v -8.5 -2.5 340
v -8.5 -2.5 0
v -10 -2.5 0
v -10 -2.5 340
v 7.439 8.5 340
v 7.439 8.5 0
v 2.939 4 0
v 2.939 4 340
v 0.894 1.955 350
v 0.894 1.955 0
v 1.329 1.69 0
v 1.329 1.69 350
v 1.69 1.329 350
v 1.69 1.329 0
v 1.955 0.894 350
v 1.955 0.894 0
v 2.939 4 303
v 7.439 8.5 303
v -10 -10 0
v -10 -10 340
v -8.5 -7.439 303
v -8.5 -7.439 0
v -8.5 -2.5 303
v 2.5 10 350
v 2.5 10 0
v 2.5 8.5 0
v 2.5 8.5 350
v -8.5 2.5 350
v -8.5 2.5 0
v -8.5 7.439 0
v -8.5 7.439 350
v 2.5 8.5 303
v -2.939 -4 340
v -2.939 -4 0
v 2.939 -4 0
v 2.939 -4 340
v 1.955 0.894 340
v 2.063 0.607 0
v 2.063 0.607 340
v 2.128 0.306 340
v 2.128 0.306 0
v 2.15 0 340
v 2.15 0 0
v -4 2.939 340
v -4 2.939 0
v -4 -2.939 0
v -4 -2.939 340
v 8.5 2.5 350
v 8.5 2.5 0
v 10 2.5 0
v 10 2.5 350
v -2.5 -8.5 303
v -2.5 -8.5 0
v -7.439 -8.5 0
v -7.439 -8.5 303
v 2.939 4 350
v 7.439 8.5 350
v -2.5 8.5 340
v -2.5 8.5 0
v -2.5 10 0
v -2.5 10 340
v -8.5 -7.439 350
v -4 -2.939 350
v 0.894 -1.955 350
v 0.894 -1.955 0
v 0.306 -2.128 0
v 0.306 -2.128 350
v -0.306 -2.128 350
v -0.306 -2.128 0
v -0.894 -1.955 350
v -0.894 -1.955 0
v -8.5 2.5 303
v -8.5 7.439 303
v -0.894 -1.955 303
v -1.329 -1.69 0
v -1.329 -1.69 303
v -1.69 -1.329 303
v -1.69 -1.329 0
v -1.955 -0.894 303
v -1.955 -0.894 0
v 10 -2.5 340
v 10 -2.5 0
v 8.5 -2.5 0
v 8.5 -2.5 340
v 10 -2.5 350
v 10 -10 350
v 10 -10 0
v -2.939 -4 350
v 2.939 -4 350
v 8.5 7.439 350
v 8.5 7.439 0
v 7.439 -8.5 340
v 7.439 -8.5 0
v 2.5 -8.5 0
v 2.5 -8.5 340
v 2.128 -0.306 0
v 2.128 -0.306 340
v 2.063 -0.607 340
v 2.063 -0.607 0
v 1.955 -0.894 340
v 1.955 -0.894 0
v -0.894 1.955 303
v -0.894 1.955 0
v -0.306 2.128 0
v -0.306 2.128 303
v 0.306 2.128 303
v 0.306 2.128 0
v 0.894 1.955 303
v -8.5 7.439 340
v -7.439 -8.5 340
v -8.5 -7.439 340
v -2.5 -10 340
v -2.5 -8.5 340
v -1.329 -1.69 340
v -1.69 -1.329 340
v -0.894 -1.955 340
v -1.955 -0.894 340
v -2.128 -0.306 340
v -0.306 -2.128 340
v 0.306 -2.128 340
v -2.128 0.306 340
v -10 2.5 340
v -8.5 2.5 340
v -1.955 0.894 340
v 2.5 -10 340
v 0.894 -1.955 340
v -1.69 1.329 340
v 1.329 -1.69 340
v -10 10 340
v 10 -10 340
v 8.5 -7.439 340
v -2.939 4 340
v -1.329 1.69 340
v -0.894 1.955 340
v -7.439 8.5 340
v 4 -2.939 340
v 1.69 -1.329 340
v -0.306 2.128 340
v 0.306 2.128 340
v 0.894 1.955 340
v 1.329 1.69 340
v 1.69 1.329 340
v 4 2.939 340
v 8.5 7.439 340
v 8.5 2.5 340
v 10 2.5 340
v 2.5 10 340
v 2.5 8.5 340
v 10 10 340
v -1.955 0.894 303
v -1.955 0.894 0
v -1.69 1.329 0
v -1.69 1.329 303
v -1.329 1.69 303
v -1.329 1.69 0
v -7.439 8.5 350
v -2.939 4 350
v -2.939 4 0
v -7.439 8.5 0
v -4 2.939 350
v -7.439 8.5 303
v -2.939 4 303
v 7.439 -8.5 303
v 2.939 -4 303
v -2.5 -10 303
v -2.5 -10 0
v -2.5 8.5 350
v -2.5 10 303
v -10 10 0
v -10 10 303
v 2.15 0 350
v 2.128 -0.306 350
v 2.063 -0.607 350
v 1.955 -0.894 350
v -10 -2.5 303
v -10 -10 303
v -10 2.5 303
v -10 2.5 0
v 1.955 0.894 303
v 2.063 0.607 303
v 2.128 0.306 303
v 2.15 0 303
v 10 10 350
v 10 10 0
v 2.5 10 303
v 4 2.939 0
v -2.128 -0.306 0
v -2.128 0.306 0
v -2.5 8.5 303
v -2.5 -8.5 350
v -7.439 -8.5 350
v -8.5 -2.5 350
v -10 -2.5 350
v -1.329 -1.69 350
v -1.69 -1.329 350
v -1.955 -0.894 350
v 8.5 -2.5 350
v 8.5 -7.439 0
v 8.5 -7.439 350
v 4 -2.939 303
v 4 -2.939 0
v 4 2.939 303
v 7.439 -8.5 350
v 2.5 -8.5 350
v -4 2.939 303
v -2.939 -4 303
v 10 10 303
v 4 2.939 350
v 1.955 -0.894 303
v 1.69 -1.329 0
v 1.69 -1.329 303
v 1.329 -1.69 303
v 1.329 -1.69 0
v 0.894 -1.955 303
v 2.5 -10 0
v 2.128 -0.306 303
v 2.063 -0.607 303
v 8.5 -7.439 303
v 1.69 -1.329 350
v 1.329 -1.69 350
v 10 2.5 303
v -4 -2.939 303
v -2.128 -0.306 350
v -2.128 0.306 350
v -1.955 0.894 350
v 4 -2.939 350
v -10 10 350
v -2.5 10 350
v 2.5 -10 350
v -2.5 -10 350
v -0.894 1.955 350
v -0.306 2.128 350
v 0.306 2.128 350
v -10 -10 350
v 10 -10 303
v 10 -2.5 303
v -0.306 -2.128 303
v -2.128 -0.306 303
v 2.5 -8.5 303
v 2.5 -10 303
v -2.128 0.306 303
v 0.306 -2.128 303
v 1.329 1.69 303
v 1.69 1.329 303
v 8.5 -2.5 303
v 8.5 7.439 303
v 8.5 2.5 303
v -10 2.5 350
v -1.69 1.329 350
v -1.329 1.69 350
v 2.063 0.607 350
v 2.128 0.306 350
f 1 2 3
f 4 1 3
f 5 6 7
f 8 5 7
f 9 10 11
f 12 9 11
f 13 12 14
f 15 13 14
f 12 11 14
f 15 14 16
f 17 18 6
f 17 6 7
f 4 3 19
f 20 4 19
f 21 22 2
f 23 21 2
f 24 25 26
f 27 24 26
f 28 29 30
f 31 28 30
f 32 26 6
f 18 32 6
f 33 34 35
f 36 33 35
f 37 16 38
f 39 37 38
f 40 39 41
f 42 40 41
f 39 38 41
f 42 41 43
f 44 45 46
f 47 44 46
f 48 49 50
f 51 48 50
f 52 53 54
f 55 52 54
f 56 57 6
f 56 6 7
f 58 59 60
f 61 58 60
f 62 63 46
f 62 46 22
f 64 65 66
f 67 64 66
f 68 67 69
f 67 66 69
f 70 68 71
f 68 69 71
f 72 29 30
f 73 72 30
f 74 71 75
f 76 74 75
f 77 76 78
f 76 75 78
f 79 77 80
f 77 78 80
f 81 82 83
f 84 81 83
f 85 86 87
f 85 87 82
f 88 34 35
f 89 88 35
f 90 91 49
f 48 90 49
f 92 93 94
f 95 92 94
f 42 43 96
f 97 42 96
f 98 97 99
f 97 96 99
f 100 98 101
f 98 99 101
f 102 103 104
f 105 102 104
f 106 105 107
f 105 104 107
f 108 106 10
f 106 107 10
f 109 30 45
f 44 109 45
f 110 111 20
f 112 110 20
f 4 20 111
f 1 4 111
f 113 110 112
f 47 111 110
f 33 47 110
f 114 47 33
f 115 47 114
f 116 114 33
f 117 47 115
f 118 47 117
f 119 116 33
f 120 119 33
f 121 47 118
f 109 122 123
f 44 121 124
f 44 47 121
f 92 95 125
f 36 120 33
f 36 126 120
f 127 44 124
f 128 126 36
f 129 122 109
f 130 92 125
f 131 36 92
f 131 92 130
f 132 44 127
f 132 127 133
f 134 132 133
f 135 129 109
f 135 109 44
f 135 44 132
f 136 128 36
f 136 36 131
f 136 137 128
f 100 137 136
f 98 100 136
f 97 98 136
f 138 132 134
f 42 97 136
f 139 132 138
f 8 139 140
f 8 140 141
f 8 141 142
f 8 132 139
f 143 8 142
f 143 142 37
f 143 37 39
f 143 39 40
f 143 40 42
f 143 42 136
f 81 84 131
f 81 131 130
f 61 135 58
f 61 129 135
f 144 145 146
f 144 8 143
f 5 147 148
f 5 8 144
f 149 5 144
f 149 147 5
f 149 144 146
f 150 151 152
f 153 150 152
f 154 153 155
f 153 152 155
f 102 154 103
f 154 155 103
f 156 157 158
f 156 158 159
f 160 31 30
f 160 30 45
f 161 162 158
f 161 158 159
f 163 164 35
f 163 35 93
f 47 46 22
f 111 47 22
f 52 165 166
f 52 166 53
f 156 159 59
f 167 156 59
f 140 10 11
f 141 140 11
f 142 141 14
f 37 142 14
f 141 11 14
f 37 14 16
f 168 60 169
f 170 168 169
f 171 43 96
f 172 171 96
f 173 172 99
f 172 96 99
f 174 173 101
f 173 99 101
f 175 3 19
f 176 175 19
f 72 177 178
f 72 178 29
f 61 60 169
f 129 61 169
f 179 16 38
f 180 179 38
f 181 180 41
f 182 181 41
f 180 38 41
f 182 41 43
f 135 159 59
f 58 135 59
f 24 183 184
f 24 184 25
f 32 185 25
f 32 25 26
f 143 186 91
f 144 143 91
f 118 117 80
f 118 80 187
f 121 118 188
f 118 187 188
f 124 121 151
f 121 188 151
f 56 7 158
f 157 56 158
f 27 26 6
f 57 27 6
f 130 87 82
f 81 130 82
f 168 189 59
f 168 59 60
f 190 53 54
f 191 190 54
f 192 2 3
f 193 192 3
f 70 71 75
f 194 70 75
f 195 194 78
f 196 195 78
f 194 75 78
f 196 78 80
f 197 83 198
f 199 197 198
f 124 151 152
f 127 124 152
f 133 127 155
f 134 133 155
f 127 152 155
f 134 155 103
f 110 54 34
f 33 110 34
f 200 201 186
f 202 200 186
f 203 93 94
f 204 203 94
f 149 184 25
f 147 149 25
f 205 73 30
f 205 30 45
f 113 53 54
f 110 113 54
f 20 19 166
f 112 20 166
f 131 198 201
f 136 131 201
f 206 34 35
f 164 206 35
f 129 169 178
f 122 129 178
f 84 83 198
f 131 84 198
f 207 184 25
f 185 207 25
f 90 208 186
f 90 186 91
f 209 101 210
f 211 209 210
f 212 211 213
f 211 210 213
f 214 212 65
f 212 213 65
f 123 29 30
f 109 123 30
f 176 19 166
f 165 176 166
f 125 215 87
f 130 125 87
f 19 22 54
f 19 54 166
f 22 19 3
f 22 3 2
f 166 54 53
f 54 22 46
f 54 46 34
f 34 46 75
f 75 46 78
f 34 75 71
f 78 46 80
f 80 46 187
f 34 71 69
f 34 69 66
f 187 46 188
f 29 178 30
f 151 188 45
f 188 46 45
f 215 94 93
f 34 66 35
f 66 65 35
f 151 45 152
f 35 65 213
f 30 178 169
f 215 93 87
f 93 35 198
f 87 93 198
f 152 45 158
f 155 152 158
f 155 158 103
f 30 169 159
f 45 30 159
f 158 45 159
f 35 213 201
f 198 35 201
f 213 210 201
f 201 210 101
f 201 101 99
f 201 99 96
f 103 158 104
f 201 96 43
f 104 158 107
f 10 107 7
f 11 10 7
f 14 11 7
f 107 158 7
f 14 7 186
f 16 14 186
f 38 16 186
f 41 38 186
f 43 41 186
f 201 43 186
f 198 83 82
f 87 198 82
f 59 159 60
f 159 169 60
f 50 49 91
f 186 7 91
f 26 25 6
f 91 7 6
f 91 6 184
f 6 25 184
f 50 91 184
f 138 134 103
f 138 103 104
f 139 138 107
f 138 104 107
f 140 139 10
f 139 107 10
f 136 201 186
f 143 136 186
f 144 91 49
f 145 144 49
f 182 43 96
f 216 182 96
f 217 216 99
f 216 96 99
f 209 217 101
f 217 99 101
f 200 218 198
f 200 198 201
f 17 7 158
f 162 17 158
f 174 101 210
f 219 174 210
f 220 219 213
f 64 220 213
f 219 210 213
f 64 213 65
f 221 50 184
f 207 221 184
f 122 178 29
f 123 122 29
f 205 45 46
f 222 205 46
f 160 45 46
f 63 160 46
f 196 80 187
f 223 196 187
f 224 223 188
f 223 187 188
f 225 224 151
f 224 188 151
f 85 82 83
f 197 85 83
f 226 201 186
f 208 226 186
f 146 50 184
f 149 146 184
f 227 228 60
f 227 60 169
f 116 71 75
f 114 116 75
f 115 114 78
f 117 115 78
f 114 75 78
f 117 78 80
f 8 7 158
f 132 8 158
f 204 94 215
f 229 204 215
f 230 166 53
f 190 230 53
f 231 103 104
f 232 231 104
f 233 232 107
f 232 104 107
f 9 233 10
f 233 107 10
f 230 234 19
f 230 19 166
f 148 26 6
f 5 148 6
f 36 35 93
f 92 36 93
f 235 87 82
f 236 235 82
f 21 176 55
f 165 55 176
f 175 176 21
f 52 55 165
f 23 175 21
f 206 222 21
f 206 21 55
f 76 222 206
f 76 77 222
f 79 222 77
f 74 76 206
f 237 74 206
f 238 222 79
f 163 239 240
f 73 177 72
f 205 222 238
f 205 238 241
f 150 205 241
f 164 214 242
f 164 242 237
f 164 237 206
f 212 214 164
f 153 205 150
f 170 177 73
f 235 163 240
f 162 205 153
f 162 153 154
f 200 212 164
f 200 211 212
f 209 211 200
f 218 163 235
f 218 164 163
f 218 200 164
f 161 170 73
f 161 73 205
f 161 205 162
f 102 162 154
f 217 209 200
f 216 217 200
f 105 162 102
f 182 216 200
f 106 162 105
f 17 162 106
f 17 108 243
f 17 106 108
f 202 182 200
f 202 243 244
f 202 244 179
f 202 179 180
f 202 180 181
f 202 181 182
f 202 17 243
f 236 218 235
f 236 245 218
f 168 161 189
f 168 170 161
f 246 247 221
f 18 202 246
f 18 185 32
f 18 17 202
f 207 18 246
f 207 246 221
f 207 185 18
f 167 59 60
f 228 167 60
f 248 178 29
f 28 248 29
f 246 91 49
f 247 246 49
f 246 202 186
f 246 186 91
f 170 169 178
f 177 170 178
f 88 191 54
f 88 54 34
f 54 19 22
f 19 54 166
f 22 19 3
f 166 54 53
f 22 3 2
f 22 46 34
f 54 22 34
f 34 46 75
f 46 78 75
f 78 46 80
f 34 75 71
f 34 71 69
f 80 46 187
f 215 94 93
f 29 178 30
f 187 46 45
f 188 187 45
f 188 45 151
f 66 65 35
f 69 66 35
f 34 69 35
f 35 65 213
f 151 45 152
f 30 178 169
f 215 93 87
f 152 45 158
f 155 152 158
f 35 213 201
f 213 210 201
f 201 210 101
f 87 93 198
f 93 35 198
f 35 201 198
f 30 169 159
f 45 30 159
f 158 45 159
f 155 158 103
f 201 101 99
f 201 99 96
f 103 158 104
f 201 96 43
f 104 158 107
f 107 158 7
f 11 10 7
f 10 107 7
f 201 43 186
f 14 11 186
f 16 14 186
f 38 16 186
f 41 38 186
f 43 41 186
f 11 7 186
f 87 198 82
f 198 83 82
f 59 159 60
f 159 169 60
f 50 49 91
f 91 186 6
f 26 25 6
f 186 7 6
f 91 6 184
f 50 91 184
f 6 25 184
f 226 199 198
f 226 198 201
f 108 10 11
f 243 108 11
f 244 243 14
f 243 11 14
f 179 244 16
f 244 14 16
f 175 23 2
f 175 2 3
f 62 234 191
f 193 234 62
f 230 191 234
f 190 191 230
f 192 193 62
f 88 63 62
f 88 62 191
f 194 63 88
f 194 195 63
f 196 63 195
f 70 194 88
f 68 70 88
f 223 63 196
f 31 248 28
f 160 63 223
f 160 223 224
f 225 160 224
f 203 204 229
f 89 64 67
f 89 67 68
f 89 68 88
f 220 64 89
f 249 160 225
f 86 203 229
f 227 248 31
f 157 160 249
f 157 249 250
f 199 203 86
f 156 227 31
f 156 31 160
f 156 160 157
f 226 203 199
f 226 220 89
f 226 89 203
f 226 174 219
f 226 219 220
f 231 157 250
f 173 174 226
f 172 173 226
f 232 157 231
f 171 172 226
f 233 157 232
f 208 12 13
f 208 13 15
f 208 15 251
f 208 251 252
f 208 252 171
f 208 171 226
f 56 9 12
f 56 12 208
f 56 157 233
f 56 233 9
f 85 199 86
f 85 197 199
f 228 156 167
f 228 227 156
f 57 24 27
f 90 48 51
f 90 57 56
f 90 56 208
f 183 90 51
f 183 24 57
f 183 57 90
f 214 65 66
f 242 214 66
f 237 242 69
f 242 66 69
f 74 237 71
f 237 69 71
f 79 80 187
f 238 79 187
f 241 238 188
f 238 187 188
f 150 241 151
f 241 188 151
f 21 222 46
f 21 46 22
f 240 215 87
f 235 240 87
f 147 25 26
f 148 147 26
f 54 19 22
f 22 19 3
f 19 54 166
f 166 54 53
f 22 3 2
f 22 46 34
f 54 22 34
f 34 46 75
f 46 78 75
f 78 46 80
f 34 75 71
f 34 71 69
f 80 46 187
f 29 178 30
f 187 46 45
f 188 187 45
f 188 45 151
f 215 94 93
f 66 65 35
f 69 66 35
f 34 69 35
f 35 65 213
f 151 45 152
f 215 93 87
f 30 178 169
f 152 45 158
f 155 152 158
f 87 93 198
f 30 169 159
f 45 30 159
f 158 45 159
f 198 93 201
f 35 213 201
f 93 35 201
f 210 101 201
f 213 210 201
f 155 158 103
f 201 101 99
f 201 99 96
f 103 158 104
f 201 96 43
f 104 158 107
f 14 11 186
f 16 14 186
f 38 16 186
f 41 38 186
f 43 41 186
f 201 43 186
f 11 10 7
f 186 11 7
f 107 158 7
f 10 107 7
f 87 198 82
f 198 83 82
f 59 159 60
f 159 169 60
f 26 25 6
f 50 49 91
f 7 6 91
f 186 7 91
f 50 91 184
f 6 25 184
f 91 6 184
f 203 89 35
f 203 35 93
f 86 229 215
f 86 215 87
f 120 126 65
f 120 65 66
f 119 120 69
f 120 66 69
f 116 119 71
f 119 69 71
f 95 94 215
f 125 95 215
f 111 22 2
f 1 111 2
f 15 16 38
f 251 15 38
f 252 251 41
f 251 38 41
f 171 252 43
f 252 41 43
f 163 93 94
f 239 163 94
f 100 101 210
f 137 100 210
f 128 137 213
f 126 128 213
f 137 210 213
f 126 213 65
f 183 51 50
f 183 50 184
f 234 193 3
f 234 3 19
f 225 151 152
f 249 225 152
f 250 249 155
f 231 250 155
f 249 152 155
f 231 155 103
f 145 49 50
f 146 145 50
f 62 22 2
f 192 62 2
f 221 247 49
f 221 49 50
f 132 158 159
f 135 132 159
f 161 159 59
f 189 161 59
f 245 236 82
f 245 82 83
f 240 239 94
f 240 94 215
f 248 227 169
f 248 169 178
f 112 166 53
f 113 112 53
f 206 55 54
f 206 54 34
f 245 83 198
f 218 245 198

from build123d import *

# Parameters (mm, degrees)
F1_DEPTH = 340
F2_DEPTH = 303
F3_DEPTH = 350


with BuildPart() as f1:
    # F0 (on Top) → F1 (new body)
    with BuildSketch(Plane.XY):
        Polygon((-8.5, 8.5), (-7.4393398282, 8.5), (-2.5, 8.5), (-2.5, 10), (-10, 10), (-10, 2.5), (-8.5, 2.5), (-8.5, 7.4393398282), align=None)
        Polygon((-4, 4), (-2.9393398282, 4), (-7.4393398282, 8.5), (-8.5, 8.5), (-8.5, 7.4393398282), (-4, 2.9393398282), align=None)
        Polygon((-2.5, -1.4393398282), (-2.5, 1.4393398282), (-3.5606601718, 2.5), (-4, 2.5), (-4, -2.5), (-3.5606601718, -2.5), align=None)
        Polygon((-2.5, 2.5), (-2.5, 3.5606601718), (-2.9393398282, 4), (-4, 4), (-4, 2.9393398282), (-3.5606601718, 2.5), align=None)
        Polygon((-4, 2.5), (-3.5606601718, 2.5), (-4, 2.9393398282), align=None)
        Polygon((-4, -2.9393398282), (-3.5606601718, -2.5), (-4, -2.5), align=None)
        Polygon((-2.9393398282, -4), (-2.5, -3.5606601718), (-2.5, -2.5), (-3.5606601718, -2.5), (-4, -2.9393398282), (-4, -4), align=None)
        Polygon((-7.4393398282, -8.5), (-2.9393398282, -4), (-4, -4), (-4, -2.9393398282), (-8.5, -7.4393398282), (-8.5, -8.5), align=None)
        Polygon((-2.5, -2.5), (-2.5, -1.4393398282), (-3.5606601718, -2.5), align=None)
        Polygon((-3.5606601718, 2.5), (-2.5, 1.4393398282), (-2.5, 2.5), align=None)
        Polygon((-2.9393398282, 4), (-2.5, 3.5606601718), (-2.5, 4), align=None)
        Polygon((-1.4393398282, 2.5), (1.4393398282, 2.5), (2.5, 3.5606601718), (2.5, 4), (-2.5, 4), (-2.5, 3.5606601718), align=None)
        Polygon((-2.5, 2.5), (-1.4393398282, 2.5), (-2.5, 3.5606601718), align=None)
        Polygon((2.5, 3.5606601718), (1.4393398282, 2.5), (2.5, 2.5), align=None)
        Polygon((2.5, 2.5), (3.5606601718, 2.5), (4, 2.9393398282), (4, 4), (2.9393398282, 4), (2.5, 3.5606601718), align=None)
        Polygon((2.5, 4), (2.5, 3.5606601718), (2.9393398282, 4), align=None)
        Polygon((4, 2.9393398282), (3.5606601718, 2.5), (4, 2.5), align=None)
        Polygon((3.5606601718, 2.5), (2.5, 1.4393398282), (2.5, -1.4393398282), (3.5606601718, -2.5), (4, -2.5), (4, 2.5), align=None)
        Polygon((4, -2.9393398282), (3.5606601718, -2.5), (2.5, -2.5), (2.5, -3.5606601718), (2.9393398282, -4), (4, -4), align=None)
        Polygon((3.5606601718, -2.5), (2.5, -1.4393398282), (2.5, -2.5), align=None)
        Polygon((2.5, -2.5), (1.4393398282, -2.5), (2.5, -3.5606601718), align=None)
        Polygon((2.5, -3.5606601718), (1.4393398282, -2.5), (-1.4393398282, -2.5), (-2.5, -3.5606601718), (-2.5, -4), (2.5, -4), align=None)
        Polygon((-2.5, -4), (-2.5, -3.5606601718), (-2.9393398282, -4), align=None)
        Polygon((4, -2.5), (3.5606601718, -2.5), (4, -2.9393398282), align=None)
        Polygon((2.9393398282, -4), (2.5, -3.5606601718), (2.5, -4), align=None)
        Polygon((8.5, -7.4393398282), (4, -2.9393398282), (4, -4), (2.9393398282, -4), (7.4393398282, -8.5), (8.5, -8.5), align=None)
        Polygon((-2.5, -3.5606601718), (-1.4393398282, -2.5), (-2.5, -2.5), align=None)
        Polygon((2.5, 2.5), (2.5, 1.4393398282), (3.5606601718, 2.5), align=None)
        Polygon((4, 4), (4, 2.9393398282), (8.5, 7.4393398282), (8.5, 8.5), (7.4393398282, 8.5), (2.9393398282, 4), align=None)
        Polygon((8.5, 8.5), (8.5, 7.4393398282), (8.5, 2.5), (10, 2.5), (10, 10), (2.5, 10), (2.5, 8.5), (7.4393398282, 8.5), align=None)
        Polygon((8.5, -2.5), (8.5, -7.4393398282), (8.5, -8.5), (7.4393398282, -8.5), (2.5, -8.5), (2.5, -10), (10, -10), (10, -2.5), align=None)
        Polygon((-2.5, -8.5), (-7.4393398282, -8.5), (-8.5, -8.5), (-8.5, -7.4393398282), (-8.5, -2.5), (-10, -2.5), (-10, -10), (-2.5, -10), align=None)
        with BuildLine():
            ThreePointArc((-1.9551107708, 0.894450599), (-1.5202795796, 1.5202795796), (-0.894450599, 1.9551107708))
            Line((-0.894450599, 1.9551107708), (-1.4393398282, 2.5))
            Line((-1.4393398282, 2.5), (-2.5, 2.5))
            Line((-2.5, 2.5), (-2.5, 1.4393398282))
            Line((-2.5, 1.4393398282), (-1.9551107708, 0.894450599))
        make_face()
        with BuildLine():
            ThreePointArc((-0.894450599, 1.9551107708), (0, 2.15), (0.894450599, 1.9551107708))
            Line((0.894450599, 1.9551107708), (1.4393398282, 2.5))
            Line((1.4393398282, 2.5), (-1.4393398282, 2.5))
            Line((-1.4393398282, 2.5), (-0.894450599, 1.9551107708))
        make_face()
        with BuildLine():
            ThreePointArc((0.894450599, 1.9551107708), (1.5202795796, 1.5202795796), (1.9551107708, 0.894450599))
            Line((1.9551107708, 0.894450599), (2.5, 1.4393398282))
            Line((2.5, 1.4393398282), (2.5, 2.5))
            Line((2.5, 2.5), (1.4393398282, 2.5))
            Line((1.4393398282, 2.5), (0.894450599, 1.9551107708))
        make_face()
        with BuildLine():
            ThreePointArc((1.9551107708, 0.894450599), (2.1007127549, 0.4577181681), (2.15, 0))
            ThreePointArc((2.15, 0), (2.1007127549, -0.4577181681), (1.9551107708, -0.894450599))
            Line((1.9551107708, -0.894450599), (2.5, -1.4393398282))
            Line((2.5, -1.4393398282), (2.5, 1.4393398282))
            Line((2.5, 1.4393398282), (1.9551107708, 0.894450599))
        make_face()
        with BuildLine():
            Line((2.5, -1.4393398282), (1.9551107708, -0.894450599))
            ThreePointArc((1.9551107708, -0.894450599), (1.5202795796, -1.5202795796), (0.894450599, -1.9551107708))
            Line((0.894450599, -1.9551107708), (1.4393398282, -2.5))
            Line((1.4393398282, -2.5), (2.5, -2.5))
            Line((2.5, -2.5), (2.5, -1.4393398282))
        make_face()
        with BuildLine():
            Line((1.4393398282, -2.5), (0.894450599, -1.9551107708))
            ThreePointArc((0.894450599, -1.9551107708), (0, -2.15), (-0.894450599, -1.9551107708))
            Line((-0.894450599, -1.9551107708), (-1.4393398282, -2.5))
            Line((-1.4393398282, -2.5), (1.4393398282, -2.5))
        make_face()
        with BuildLine():
            Line((-1.4393398282, -2.5), (-0.894450599, -1.9551107708))
            ThreePointArc((-0.894450599, -1.9551107708), (-1.5202795796, -1.5202795796), (-1.9551107708, -0.894450599))
            Line((-1.9551107708, -0.894450599), (-2.5, -1.4393398282))
            Line((-2.5, -1.4393398282), (-2.5, -2.5))
            Line((-2.5, -2.5), (-1.4393398282, -2.5))
        make_face()
        with BuildLine():
            ThreePointArc((-1.9551107708, -0.894450599), (-2.15, 0), (-1.9551107708, 0.894450599))
            Line((-1.9551107708, 0.894450599), (-2.5, 1.4393398282))
            Line((-2.5, 1.4393398282), (-2.5, -1.4393398282))
            Line((-2.5, -1.4393398282), (-1.9551107708, -0.894450599))
        make_face()
    extrude(amount=F1_DEPTH)


with BuildPart() as f2:
    # F0 (on Top) → F2 (new body)
    with BuildSketch(Plane.XY):
        Polygon((2.5, -2.5), (1.4393398282, -2.5), (2.5, -3.5606601718), align=None)
        with BuildLine():
            Line((-1.4393398282, -2.5), (-0.894450599, -1.9551107708))
            ThreePointArc((-0.894450599, -1.9551107708), (-1.5202795796, -1.5202795796), (-1.9551107708, -0.894450599))
            Line((-1.9551107708, -0.894450599), (-2.5, -1.4393398282))
            Line((-2.5, -1.4393398282), (-2.5, -2.5))
            Line((-2.5, -2.5), (-1.4393398282, -2.5))
        make_face()
        Polygon((-2.5, -3.5606601718), (-1.4393398282, -2.5), (-2.5, -2.5), align=None)
        Polygon((2.5, 2.5), (2.5, 1.4393398282), (3.5606601718, 2.5), align=None)
        Polygon((-2.5, -1.4393398282), (-2.5, 1.4393398282), (-3.5606601718, 2.5), (-4, 2.5), (-4, -2.5), (-3.5606601718, -2.5), align=None)
        Polygon((3.5606601718, 2.5), (2.5, 1.4393398282), (2.5, -1.4393398282), (3.5606601718, -2.5), (4, -2.5), (4, 2.5), align=None)
        Polygon((-2.5, 2.5), (-2.5, 3.5606601718), (-2.9393398282, 4), (-4, 4), (-4, 2.9393398282), (-3.5606601718, 2.5), align=None)
        Polygon((-3.5606601718, 2.5), (-2.5, 1.4393398282), (-2.5, 2.5), align=None)
        Polygon((-7.4393398282, -8.5), (-2.9393398282, -4), (-4, -4), (-4, -2.9393398282), (-8.5, -7.4393398282), (-8.5, -8.5), align=None)
        Polygon((-1.4393398282, 2.5), (1.4393398282, 2.5), (2.5, 3.5606601718), (2.5, 4), (-2.5, 4), (-2.5, 3.5606601718), align=None)
        Polygon((-8.5, 8.5), (-7.4393398282, 8.5), (-2.5, 8.5), (-2.5, 10), (-10, 10), (-10, 2.5), (-8.5, 2.5), (-8.5, 7.4393398282), align=None)
        Polygon((-2.9393398282, -4), (-2.5, -3.5606601718), (-2.5, -2.5), (-3.5606601718, -2.5), (-4, -2.9393398282), (-4, -4), align=None)
        Polygon((4, 4), (4, 2.9393398282), (8.5, 7.4393398282), (8.5, 8.5), (7.4393398282, 8.5), (2.9393398282, 4), align=None)
        Polygon((8.5, -7.4393398282), (4, -2.9393398282), (4, -4), (2.9393398282, -4), (7.4393398282, -8.5), (8.5, -8.5), align=None)
        Polygon((8.5, 8.5), (8.5, 7.4393398282), (8.5, 2.5), (10, 2.5), (10, 10), (2.5, 10), (2.5, 8.5), (7.4393398282, 8.5), align=None)
        with BuildLine():
            ThreePointArc((0.894450599, 1.9551107708), (1.5202795796, 1.5202795796), (1.9551107708, 0.894450599))
            Line((1.9551107708, 0.894450599), (2.5, 1.4393398282))
            Line((2.5, 1.4393398282), (2.5, 2.5))
            Line((2.5, 2.5), (1.4393398282, 2.5))
            Line((1.4393398282, 2.5), (0.894450599, 1.9551107708))
        make_face()
        Polygon((2.5, 3.5606601718), (1.4393398282, 2.5), (2.5, 2.5), align=None)
        Polygon((-2.5, -2.5), (-2.5, -1.4393398282), (-3.5606601718, -2.5), align=None)
        Polygon((2.5, -3.5606601718), (1.4393398282, -2.5), (-1.4393398282, -2.5), (-2.5, -3.5606601718), (-2.5, -4), (2.5, -4), align=None)
        with BuildLine():
            ThreePointArc((-1.9551107708, -0.894450599), (-2.15, 0), (-1.9551107708, 0.894450599))
            Line((-1.9551107708, 0.894450599), (-2.5, 1.4393398282))
            Line((-2.5, 1.4393398282), (-2.5, -1.4393398282))
            Line((-2.5, -1.4393398282), (-1.9551107708, -0.894450599))
        make_face()
        Polygon((-2.5, 2.5), (-1.4393398282, 2.5), (-2.5, 3.5606601718), align=None)
        with BuildLine():
            Line((1.4393398282, -2.5), (0.894450599, -1.9551107708))
            ThreePointArc((0.894450599, -1.9551107708), (0, -2.15), (-0.894450599, -1.9551107708))
            Line((-0.894450599, -1.9551107708), (-1.4393398282, -2.5))
            Line((-1.4393398282, -2.5), (1.4393398282, -2.5))
        make_face()
        with BuildLine():
            Line((2.5, -1.4393398282), (1.9551107708, -0.894450599))
            ThreePointArc((1.9551107708, -0.894450599), (1.5202795796, -1.5202795796), (0.894450599, -1.9551107708))
            Line((0.894450599, -1.9551107708), (1.4393398282, -2.5))
            Line((1.4393398282, -2.5), (2.5, -2.5))
            Line((2.5, -2.5), (2.5, -1.4393398282))
        make_face()
        with BuildLine():
            ThreePointArc((-1.9551107708, 0.894450599), (-1.5202795796, 1.5202795796), (-0.894450599, 1.9551107708))
            Line((-0.894450599, 1.9551107708), (-1.4393398282, 2.5))
            Line((-1.4393398282, 2.5), (-2.5, 2.5))
            Line((-2.5, 2.5), (-2.5, 1.4393398282))
            Line((-2.5, 1.4393398282), (-1.9551107708, 0.894450599))
        make_face()
        Polygon((2.5, 2.5), (3.5606601718, 2.5), (4, 2.9393398282), (4, 4), (2.9393398282, 4), (2.5, 3.5606601718), align=None)
        with BuildLine():
            ThreePointArc((1.9551107708, 0.894450599), (2.1007127549, 0.4577181681), (2.15, 0))
            ThreePointArc((2.15, 0), (2.1007127549, -0.4577181681), (1.9551107708, -0.894450599))
            Line((1.9551107708, -0.894450599), (2.5, -1.4393398282))
            Line((2.5, -1.4393398282), (2.5, 1.4393398282))
            Line((2.5, 1.4393398282), (1.9551107708, 0.894450599))
        make_face()
        Polygon((-4, 4), (-2.9393398282, 4), (-7.4393398282, 8.5), (-8.5, 8.5), (-8.5, 7.4393398282), (-4, 2.9393398282), align=None)
        Polygon((4, -2.9393398282), (3.5606601718, -2.5), (2.5, -2.5), (2.5, -3.5606601718), (2.9393398282, -4), (4, -4), align=None)
        Polygon((3.5606601718, -2.5), (2.5, -1.4393398282), (2.5, -2.5), align=None)
        Polygon((-2.9393398282, 4), (-2.5, 3.5606601718), (-2.5, 4), align=None)
        Polygon((-4, 2.5), (-3.5606601718, 2.5), (-4, 2.9393398282), align=None)
        Polygon((2.9393398282, -4), (2.5, -3.5606601718), (2.5, -4), align=None)
        Polygon((4, -2.5), (3.5606601718, -2.5), (4, -2.9393398282), align=None)
        Polygon((-4, -2.9393398282), (-3.5606601718, -2.5), (-4, -2.5), align=None)
        Polygon((4, 2.9393398282), (3.5606601718, 2.5), (4, 2.5), align=None)
        Polygon((-2.5, -4), (-2.5, -3.5606601718), (-2.9393398282, -4), align=None)
        Polygon((2.5, 4), (2.5, 3.5606601718), (2.9393398282, 4), align=None)
        with BuildLine():
            ThreePointArc((-0.894450599, 1.9551107708), (0, 2.15), (0.894450599, 1.9551107708))
            Line((0.894450599, 1.9551107708), (1.4393398282, 2.5))
            Line((1.4393398282, 2.5), (-1.4393398282, 2.5))
            Line((-1.4393398282, 2.5), (-0.894450599, 1.9551107708))
        make_face()
        Polygon((-2.5, -8.5), (-7.4393398282, -8.5), (-8.5, -8.5), (-8.5, -7.4393398282), (-8.5, -2.5), (-10, -2.5), (-10, -10), (-2.5, -10), align=None)
        Polygon((8.5, -2.5), (8.5, -7.4393398282), (8.5, -8.5), (7.4393398282, -8.5), (2.5, -8.5), (2.5, -10), (10, -10), (10, -2.5), align=None)
    extrude(amount=F2_DEPTH)


with BuildPart() as f3:
    # F0 (on Top) → F3 (new body)
    with BuildSketch(Plane.XY):
        Polygon((2.5, -2.5), (1.4393398282, -2.5), (2.5, -3.5606601718), align=None)
        with BuildLine():
            Line((-1.4393398282, -2.5), (-0.894450599, -1.9551107708))
            ThreePointArc((-0.894450599, -1.9551107708), (-1.5202795796, -1.5202795796), (-1.9551107708, -0.894450599))
            Line((-1.9551107708, -0.894450599), (-2.5, -1.4393398282))
            Line((-2.5, -1.4393398282), (-2.5, -2.5))
            Line((-2.5, -2.5), (-1.4393398282, -2.5))
        make_face()
        Polygon((2.9393398282, -4), (2.5, -3.5606601718), (2.5, -4), align=None)
        Polygon((-2.5, -3.5606601718), (-1.4393398282, -2.5), (-2.5, -2.5), align=None)
        Polygon((8.5, -2.5), (8.5, -7.4393398282), (8.5, -8.5), (7.4393398282, -8.5), (2.5, -8.5), (2.5, -10), (10, -10), (10, -2.5), align=None)
        Polygon((2.5, 2.5), (2.5, 1.4393398282), (3.5606601718, 2.5), align=None)
        Polygon((4, -2.5), (3.5606601718, -2.5), (4, -2.9393398282), align=None)
        Polygon((-2.5, -1.4393398282), (-2.5, 1.4393398282), (-3.5606601718, 2.5), (-4, 2.5), (-4, -2.5), (-3.5606601718, -2.5), align=None)
        Polygon((3.5606601718, 2.5), (2.5, 1.4393398282), (2.5, -1.4393398282), (3.5606601718, -2.5), (4, -2.5), (4, 2.5), align=None)
        Polygon((-2.5, 2.5), (-2.5, 3.5606601718), (-2.9393398282, 4), (-4, 4), (-4, 2.9393398282), (-3.5606601718, 2.5), align=None)
        Polygon((-3.5606601718, 2.5), (-2.5, 1.4393398282), (-2.5, 2.5), align=None)
        Polygon((-2.5, -4), (-2.5, -3.5606601718), (-2.9393398282, -4), align=None)
        Polygon((-7.4393398282, -8.5), (-2.9393398282, -4), (-4, -4), (-4, -2.9393398282), (-8.5, -7.4393398282), (-8.5, -8.5), align=None)
        Polygon((-1.4393398282, 2.5), (1.4393398282, 2.5), (2.5, 3.5606601718), (2.5, 4), (-2.5, 4), (-2.5, 3.5606601718), align=None)
        Polygon((-8.5, 8.5), (-7.4393398282, 8.5), (-2.5, 8.5), (-2.5, 10), (-10, 10), (-10, 2.5), (-8.5, 2.5), (-8.5, 7.4393398282), align=None)
        Polygon((-2.9393398282, -4), (-2.5, -3.5606601718), (-2.5, -2.5), (-3.5606601718, -2.5), (-4, -2.9393398282), (-4, -4), align=None)
        with BuildLine():
            ThreePointArc((-0.894450599, 1.9551107708), (0, 2.15), (0.894450599, 1.9551107708))
            Line((0.894450599, 1.9551107708), (1.4393398282, 2.5))
            Line((1.4393398282, 2.5), (-1.4393398282, 2.5))
            Line((-1.4393398282, 2.5), (-0.894450599, 1.9551107708))
        make_face()
        Polygon((4, 4), (4, 2.9393398282), (8.5, 7.4393398282), (8.5, 8.5), (7.4393398282, 8.5), (2.9393398282, 4), align=None)
        Polygon((8.5, -7.4393398282), (4, -2.9393398282), (4, -4), (2.9393398282, -4), (7.4393398282, -8.5), (8.5, -8.5), align=None)
        Polygon((8.5, 8.5), (8.5, 7.4393398282), (8.5, 2.5), (10, 2.5), (10, 10), (2.5, 10), (2.5, 8.5), (7.4393398282, 8.5), align=None)
        with BuildLine():
            ThreePointArc((0.894450599, 1.9551107708), (1.5202795796, 1.5202795796), (1.9551107708, 0.894450599))
            Line((1.9551107708, 0.894450599), (2.5, 1.4393398282))
            Line((2.5, 1.4393398282), (2.5, 2.5))
            Line((2.5, 2.5), (1.4393398282, 2.5))
            Line((1.4393398282, 2.5), (0.894450599, 1.9551107708))
        make_face()
        Polygon((2.5, 3.5606601718), (1.4393398282, 2.5), (2.5, 2.5), align=None)
        Polygon((-2.5, -2.5), (-2.5, -1.4393398282), (-3.5606601718, -2.5), align=None)
        Polygon((2.5, -3.5606601718), (1.4393398282, -2.5), (-1.4393398282, -2.5), (-2.5, -3.5606601718), (-2.5, -4), (2.5, -4), align=None)
        with BuildLine():
            ThreePointArc((-1.9551107708, -0.894450599), (-2.15, 0), (-1.9551107708, 0.894450599))
            Line((-1.9551107708, 0.894450599), (-2.5, 1.4393398282))
            Line((-2.5, 1.4393398282), (-2.5, -1.4393398282))
            Line((-2.5, -1.4393398282), (-1.9551107708, -0.894450599))
        make_face()
        Polygon((-2.5, -8.5), (-7.4393398282, -8.5), (-8.5, -8.5), (-8.5, -7.4393398282), (-8.5, -2.5), (-10, -2.5), (-10, -10), (-2.5, -10), align=None)
        Polygon((-2.5, 2.5), (-1.4393398282, 2.5), (-2.5, 3.5606601718), align=None)
        with BuildLine():
            Line((1.4393398282, -2.5), (0.894450599, -1.9551107708))
            ThreePointArc((0.894450599, -1.9551107708), (0, -2.15), (-0.894450599, -1.9551107708))
            Line((-0.894450599, -1.9551107708), (-1.4393398282, -2.5))
            Line((-1.4393398282, -2.5), (1.4393398282, -2.5))
        make_face()
        with BuildLine():
            Line((2.5, -1.4393398282), (1.9551107708, -0.894450599))
            ThreePointArc((1.9551107708, -0.894450599), (1.5202795796, -1.5202795796), (0.894450599, -1.9551107708))
            Line((0.894450599, -1.9551107708), (1.4393398282, -2.5))
            Line((1.4393398282, -2.5), (2.5, -2.5))
            Line((2.5, -2.5), (2.5, -1.4393398282))
        make_face()
        with BuildLine():
            ThreePointArc((-1.9551107708, 0.894450599), (-1.5202795796, 1.5202795796), (-0.894450599, 1.9551107708))
            Line((-0.894450599, 1.9551107708), (-1.4393398282, 2.5))
            Line((-1.4393398282, 2.5), (-2.5, 2.5))
            Line((-2.5, 2.5), (-2.5, 1.4393398282))
            Line((-2.5, 1.4393398282), (-1.9551107708, 0.894450599))
        make_face()
        Polygon((2.5, 2.5), (3.5606601718, 2.5), (4, 2.9393398282), (4, 4), (2.9393398282, 4), (2.5, 3.5606601718), align=None)
        with BuildLine():
            ThreePointArc((1.9551107708, 0.894450599), (2.1007127549, 0.4577181681), (2.15, 0))
            ThreePointArc((2.15, 0), (2.1007127549, -0.4577181681), (1.9551107708, -0.894450599))
            Line((1.9551107708, -0.894450599), (2.5, -1.4393398282))
            Line((2.5, -1.4393398282), (2.5, 1.4393398282))
            Line((2.5, 1.4393398282), (1.9551107708, 0.894450599))
        make_face()
        Polygon((-4, 4), (-2.9393398282, 4), (-7.4393398282, 8.5), (-8.5, 8.5), (-8.5, 7.4393398282), (-4, 2.9393398282), align=None)
        Polygon((4, -2.9393398282), (3.5606601718, -2.5), (2.5, -2.5), (2.5, -3.5606601718), (2.9393398282, -4), (4, -4), align=None)
        Polygon((3.5606601718, -2.5), (2.5, -1.4393398282), (2.5, -2.5), align=None)
        Polygon((-2.9393398282, 4), (-2.5, 3.5606601718), (-2.5, 4), align=None)
        Polygon((-4, 2.5), (-3.5606601718, 2.5), (-4, 2.9393398282), align=None)
        Polygon((-4, -2.9393398282), (-3.5606601718, -2.5), (-4, -2.5), align=None)
        Polygon((4, 2.9393398282), (3.5606601718, 2.5), (4, 2.5), align=None)
        Polygon((2.5, 4), (2.5, 3.5606601718), (2.9393398282, 4), align=None)
    extrude(amount=F3_DEPTH)


solid = Compound([f1.part, f2.part, f3.part])
